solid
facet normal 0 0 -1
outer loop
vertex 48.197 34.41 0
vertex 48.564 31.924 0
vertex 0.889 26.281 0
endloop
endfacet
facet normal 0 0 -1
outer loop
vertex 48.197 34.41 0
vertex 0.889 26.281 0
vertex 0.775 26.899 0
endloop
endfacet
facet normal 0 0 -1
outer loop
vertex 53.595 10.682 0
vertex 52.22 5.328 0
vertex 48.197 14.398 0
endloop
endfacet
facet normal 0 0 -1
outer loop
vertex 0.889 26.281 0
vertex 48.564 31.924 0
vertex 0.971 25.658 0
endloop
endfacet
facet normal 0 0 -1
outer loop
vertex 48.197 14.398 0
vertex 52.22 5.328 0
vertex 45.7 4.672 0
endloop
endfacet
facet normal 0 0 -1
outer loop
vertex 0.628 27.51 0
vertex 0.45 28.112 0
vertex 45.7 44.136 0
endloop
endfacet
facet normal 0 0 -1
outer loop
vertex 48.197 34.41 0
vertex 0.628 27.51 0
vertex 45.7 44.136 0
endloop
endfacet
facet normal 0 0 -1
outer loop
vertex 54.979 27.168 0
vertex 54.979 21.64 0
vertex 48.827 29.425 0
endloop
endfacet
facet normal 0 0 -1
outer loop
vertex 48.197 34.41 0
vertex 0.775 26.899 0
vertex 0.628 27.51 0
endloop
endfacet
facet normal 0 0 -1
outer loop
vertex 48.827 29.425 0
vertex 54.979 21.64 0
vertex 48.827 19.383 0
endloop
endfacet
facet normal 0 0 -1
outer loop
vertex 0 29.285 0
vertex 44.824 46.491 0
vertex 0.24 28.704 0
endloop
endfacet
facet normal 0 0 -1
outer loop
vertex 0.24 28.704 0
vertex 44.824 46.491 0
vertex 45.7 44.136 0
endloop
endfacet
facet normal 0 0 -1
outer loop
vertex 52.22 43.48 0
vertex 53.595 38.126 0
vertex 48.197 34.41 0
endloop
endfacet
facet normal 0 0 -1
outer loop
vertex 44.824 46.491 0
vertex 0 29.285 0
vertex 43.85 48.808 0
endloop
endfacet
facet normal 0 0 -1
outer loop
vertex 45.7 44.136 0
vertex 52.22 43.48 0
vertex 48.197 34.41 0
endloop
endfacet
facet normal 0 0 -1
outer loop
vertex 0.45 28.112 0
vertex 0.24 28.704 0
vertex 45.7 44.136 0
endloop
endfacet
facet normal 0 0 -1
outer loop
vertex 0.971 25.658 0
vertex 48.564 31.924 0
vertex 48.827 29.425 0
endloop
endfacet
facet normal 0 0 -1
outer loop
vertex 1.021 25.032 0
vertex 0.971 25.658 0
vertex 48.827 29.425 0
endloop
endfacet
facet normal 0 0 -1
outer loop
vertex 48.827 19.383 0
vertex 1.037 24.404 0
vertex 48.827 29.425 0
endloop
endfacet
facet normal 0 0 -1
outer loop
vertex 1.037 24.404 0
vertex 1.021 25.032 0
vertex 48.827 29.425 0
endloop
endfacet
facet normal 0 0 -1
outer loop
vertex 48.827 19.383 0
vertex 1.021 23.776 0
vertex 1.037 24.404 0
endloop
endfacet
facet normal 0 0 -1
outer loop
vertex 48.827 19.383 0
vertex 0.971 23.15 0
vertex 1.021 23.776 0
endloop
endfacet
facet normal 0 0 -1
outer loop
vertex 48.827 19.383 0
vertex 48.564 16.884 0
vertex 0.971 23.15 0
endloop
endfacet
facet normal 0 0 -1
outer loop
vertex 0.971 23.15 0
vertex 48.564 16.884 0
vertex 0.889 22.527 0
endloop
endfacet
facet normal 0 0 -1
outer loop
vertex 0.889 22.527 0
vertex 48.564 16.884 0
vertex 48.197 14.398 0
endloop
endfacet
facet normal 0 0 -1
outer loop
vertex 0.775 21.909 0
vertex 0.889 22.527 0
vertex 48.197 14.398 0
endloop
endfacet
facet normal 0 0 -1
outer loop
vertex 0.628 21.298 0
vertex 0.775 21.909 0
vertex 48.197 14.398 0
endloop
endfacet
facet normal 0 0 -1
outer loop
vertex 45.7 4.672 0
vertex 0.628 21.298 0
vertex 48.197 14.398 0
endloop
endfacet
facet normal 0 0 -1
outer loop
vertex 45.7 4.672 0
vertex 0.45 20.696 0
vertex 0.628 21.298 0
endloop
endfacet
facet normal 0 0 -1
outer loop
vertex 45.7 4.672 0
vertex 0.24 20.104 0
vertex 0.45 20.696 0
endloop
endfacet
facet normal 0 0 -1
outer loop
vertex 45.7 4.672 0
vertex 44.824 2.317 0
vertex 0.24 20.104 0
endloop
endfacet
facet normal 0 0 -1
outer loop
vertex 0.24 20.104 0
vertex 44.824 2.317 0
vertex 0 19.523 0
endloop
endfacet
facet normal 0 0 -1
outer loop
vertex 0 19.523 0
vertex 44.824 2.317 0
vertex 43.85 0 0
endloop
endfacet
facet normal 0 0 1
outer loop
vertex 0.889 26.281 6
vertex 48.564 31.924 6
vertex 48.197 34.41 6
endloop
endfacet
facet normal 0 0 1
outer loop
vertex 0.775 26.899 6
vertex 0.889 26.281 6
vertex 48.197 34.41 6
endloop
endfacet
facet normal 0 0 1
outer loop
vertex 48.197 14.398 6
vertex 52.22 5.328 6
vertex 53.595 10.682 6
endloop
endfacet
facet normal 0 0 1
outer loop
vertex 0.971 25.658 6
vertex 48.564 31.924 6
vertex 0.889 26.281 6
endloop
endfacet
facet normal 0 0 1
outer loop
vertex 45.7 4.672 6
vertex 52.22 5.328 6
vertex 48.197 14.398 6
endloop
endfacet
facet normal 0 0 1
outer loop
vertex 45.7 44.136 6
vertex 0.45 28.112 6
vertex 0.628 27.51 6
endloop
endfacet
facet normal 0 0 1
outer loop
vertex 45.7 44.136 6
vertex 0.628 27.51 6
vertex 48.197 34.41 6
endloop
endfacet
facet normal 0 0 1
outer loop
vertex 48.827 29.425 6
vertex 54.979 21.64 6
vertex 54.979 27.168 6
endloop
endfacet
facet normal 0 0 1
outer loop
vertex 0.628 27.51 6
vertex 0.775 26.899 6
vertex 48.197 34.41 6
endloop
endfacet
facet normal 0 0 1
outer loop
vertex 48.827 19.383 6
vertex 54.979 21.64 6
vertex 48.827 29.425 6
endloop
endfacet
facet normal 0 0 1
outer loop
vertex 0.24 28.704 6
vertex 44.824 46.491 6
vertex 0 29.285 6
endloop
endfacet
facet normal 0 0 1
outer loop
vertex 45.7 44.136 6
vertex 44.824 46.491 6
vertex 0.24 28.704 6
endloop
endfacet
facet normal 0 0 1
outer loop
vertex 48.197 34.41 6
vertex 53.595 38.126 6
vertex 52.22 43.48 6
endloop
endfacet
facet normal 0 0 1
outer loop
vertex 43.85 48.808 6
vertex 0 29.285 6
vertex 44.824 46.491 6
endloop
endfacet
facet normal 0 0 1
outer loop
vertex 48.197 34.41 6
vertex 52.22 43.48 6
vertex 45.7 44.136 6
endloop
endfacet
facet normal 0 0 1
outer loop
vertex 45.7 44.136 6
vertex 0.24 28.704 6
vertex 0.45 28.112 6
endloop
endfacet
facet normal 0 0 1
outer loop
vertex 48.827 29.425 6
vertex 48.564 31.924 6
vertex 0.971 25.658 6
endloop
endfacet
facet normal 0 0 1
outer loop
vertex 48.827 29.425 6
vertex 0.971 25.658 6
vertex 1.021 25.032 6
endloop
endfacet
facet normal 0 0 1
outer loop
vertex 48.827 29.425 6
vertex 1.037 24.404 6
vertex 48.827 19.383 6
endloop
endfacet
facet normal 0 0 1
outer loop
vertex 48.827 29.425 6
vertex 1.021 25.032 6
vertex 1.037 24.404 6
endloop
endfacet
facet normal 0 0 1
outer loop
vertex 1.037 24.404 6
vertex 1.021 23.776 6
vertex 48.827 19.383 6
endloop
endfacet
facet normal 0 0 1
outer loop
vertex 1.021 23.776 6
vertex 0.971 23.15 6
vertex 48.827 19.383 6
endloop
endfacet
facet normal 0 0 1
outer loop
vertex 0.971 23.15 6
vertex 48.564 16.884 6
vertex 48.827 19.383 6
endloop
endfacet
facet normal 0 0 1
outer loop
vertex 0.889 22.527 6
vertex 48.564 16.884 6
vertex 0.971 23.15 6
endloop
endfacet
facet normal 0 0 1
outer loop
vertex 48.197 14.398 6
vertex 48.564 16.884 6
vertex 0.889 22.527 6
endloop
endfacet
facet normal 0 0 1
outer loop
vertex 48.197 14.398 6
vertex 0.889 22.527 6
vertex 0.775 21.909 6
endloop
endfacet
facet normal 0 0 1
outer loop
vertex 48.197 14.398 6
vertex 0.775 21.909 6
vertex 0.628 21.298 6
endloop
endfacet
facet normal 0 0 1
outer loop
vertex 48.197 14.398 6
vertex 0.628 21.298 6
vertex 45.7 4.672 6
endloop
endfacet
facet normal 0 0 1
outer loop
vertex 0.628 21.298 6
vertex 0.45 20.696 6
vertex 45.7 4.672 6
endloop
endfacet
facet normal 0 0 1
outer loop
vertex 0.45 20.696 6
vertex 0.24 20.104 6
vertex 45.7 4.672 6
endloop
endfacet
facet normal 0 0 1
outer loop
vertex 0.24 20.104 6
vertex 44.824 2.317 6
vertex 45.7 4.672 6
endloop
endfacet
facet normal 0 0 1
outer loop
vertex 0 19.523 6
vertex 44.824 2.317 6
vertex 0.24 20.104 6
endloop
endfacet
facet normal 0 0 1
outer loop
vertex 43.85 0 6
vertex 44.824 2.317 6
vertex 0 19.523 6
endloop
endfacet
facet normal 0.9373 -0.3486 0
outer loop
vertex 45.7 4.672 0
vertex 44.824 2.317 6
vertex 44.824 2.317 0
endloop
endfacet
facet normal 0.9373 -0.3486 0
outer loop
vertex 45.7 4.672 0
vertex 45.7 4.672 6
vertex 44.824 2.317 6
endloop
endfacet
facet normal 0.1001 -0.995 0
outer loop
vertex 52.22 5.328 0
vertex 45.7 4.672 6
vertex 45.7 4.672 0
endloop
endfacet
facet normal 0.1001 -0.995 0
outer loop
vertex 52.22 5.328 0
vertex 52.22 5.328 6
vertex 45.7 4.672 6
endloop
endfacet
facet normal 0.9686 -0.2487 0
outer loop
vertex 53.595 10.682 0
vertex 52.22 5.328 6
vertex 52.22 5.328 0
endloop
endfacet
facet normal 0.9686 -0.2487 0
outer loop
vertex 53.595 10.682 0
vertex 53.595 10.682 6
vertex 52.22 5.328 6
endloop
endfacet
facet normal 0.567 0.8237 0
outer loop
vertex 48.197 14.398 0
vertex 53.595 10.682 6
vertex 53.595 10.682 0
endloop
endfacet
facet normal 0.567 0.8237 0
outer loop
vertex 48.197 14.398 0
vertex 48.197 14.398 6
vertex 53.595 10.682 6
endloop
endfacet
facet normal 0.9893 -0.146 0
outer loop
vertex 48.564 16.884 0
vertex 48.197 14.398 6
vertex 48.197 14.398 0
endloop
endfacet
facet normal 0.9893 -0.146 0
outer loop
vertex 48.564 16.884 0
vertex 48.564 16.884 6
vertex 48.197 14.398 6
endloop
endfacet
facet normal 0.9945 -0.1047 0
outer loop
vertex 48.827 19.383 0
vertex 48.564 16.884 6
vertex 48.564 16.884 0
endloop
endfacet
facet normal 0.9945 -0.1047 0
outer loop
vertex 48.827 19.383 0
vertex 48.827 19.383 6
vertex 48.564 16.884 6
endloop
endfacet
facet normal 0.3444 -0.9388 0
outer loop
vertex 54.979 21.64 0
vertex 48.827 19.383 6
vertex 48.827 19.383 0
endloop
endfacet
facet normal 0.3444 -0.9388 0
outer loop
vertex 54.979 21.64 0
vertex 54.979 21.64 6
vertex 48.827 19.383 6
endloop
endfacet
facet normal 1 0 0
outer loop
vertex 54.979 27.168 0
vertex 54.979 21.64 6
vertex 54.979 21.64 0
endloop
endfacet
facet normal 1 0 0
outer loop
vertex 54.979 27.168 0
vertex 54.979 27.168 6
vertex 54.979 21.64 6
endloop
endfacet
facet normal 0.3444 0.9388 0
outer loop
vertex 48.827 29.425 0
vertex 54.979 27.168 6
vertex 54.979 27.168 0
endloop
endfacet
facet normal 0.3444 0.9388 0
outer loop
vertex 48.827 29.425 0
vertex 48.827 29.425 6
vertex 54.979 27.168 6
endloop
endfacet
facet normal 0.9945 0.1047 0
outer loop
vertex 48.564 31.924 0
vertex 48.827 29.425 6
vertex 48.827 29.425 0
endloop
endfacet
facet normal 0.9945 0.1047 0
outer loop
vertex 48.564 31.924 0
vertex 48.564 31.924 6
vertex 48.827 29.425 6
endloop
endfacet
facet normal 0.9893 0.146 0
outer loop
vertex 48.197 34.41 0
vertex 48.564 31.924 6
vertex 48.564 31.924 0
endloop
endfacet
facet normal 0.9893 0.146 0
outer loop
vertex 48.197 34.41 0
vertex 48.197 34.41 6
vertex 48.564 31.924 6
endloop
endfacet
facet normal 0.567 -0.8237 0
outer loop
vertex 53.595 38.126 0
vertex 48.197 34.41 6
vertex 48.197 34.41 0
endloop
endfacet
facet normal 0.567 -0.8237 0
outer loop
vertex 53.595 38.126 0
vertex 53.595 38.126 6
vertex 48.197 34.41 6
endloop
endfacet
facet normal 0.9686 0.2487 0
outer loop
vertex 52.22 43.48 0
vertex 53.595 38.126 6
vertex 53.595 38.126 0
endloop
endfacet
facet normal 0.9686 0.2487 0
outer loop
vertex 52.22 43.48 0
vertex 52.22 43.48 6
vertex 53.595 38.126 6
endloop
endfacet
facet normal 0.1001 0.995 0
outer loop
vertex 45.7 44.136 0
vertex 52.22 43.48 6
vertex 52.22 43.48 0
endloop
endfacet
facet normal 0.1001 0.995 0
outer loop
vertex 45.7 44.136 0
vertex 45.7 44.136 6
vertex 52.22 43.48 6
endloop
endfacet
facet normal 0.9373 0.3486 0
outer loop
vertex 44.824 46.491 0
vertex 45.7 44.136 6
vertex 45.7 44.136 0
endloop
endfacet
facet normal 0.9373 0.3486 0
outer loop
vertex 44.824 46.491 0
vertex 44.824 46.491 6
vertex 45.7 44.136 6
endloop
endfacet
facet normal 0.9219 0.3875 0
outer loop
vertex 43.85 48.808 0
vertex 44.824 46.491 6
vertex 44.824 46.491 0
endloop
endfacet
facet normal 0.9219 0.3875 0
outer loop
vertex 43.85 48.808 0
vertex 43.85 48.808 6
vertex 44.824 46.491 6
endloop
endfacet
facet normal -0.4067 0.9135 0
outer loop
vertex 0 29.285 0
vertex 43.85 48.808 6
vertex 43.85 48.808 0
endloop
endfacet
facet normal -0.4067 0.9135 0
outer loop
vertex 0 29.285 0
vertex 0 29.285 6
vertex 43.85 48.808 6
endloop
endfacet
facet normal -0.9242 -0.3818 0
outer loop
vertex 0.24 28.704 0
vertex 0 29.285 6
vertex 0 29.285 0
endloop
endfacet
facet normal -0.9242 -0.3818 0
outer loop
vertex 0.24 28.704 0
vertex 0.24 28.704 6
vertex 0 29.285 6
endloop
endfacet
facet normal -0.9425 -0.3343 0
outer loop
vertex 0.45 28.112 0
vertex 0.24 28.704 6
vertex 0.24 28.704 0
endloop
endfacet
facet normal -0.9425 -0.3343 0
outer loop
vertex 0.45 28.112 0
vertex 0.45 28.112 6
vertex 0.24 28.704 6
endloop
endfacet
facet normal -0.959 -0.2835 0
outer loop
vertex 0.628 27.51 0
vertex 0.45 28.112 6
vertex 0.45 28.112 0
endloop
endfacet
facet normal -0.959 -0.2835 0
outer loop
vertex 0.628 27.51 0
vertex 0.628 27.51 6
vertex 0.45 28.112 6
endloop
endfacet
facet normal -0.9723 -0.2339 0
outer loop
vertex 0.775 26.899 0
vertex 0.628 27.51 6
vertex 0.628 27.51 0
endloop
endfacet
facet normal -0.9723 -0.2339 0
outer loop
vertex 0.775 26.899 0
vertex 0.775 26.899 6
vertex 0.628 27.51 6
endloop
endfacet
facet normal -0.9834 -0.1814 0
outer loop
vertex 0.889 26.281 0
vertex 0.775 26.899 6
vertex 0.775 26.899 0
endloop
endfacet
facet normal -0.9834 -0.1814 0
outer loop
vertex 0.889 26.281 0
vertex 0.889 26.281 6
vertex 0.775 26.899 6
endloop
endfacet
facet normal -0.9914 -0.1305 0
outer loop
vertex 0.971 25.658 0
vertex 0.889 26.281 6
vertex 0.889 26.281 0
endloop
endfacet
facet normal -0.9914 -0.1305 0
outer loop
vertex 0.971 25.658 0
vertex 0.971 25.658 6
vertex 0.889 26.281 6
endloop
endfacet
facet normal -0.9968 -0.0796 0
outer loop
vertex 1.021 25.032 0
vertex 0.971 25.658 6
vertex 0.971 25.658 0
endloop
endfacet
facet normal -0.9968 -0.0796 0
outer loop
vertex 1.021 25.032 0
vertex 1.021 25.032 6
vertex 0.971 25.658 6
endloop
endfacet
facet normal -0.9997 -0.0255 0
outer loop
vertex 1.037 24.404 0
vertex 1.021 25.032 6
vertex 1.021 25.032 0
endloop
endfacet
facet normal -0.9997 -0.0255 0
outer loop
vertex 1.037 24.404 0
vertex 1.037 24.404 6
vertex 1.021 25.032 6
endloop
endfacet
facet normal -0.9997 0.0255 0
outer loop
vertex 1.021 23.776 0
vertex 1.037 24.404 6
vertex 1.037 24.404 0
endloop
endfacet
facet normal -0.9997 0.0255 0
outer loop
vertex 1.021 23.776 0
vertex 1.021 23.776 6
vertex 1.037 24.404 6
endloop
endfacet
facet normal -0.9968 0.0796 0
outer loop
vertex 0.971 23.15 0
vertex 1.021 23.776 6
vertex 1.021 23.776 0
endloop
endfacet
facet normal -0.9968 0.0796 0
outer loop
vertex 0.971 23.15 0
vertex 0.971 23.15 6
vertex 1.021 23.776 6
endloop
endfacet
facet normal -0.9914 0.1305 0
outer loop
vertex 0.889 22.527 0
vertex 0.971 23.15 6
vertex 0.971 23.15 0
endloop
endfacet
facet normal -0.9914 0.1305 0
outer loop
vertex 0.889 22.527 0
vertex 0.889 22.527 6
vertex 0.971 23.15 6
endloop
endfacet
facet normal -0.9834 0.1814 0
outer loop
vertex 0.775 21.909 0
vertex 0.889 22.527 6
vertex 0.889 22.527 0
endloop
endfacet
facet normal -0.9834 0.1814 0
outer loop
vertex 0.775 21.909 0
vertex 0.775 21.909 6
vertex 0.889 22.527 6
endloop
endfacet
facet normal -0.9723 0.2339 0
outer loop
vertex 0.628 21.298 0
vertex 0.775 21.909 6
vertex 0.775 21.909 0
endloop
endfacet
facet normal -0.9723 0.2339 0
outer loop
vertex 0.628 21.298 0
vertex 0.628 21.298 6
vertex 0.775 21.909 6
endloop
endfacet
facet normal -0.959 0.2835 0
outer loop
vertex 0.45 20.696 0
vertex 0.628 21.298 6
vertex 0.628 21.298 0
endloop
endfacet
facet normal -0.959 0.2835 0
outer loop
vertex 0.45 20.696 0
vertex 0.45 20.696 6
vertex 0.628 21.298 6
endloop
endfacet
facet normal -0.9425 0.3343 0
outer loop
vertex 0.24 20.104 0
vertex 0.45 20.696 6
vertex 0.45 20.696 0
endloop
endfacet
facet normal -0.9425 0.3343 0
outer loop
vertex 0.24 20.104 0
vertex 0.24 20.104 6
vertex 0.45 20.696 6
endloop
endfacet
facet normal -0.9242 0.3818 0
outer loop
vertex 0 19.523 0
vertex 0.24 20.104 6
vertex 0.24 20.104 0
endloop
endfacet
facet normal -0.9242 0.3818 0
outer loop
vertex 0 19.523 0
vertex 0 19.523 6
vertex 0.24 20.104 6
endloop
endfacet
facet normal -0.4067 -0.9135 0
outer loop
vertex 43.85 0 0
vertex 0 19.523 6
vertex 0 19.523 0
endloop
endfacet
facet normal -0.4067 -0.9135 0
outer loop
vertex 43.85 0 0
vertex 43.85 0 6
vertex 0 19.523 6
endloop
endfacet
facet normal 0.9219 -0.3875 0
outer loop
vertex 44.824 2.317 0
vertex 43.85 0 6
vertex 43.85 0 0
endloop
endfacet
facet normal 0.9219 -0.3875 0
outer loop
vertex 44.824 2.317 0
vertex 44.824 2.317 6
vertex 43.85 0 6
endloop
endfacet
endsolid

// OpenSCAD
$fn = 32;

// ----------------------------------------------------------------------
// Gear sector: 3 teeth on 48 degrees
// ----------------------------------------------------------------------

// --- parameters (mm) ---
sector_angle = 48;        // sector angle, degrees
root_r = 60;              // root circle radius
tooth_h = 6;              // tooth height over the root circle
teeth = 3;                // number of teeth on the sector
hub_r = 12;               // hub bore radius
plate_t = 6;              // sector thickness, Z
arc_step = 3;             // sampling step of the root/hub arcs, degrees

tip_r = root_r + tooth_h;  // tip circle radius

profile = [[43.85, 0], [44.824, 2.317], [45.7, 4.672], [52.22, 5.328], [53.595, 10.682], [48.197, 14.398], [48.564, 16.884], [48.827, 19.383], [54.979, 21.64], [54.979, 27.168], [48.827, 29.425], [48.564, 31.924], [48.197, 34.41], [53.595, 38.126], [52.22, 43.48], [45.7, 44.136], [44.824, 46.491], [43.85, 48.808], [0, 29.285], [0.24, 28.704], [0.45, 28.112], [0.628, 27.51], [0.775, 26.899], [0.889, 26.281], [0.971, 25.658], [1.021, 25.032], [1.037, 24.404], [1.021, 23.776], [0.971, 23.15], [0.889, 22.527], [0.775, 21.909], [0.628, 21.298], [0.45, 20.696], [0.24, 20.104], [0, 19.523]];  // primary outline, 35 points, counter clockwise

// --- the one profile operation ---
linear_extrude(height = plate_t) polygon(points = profile);
